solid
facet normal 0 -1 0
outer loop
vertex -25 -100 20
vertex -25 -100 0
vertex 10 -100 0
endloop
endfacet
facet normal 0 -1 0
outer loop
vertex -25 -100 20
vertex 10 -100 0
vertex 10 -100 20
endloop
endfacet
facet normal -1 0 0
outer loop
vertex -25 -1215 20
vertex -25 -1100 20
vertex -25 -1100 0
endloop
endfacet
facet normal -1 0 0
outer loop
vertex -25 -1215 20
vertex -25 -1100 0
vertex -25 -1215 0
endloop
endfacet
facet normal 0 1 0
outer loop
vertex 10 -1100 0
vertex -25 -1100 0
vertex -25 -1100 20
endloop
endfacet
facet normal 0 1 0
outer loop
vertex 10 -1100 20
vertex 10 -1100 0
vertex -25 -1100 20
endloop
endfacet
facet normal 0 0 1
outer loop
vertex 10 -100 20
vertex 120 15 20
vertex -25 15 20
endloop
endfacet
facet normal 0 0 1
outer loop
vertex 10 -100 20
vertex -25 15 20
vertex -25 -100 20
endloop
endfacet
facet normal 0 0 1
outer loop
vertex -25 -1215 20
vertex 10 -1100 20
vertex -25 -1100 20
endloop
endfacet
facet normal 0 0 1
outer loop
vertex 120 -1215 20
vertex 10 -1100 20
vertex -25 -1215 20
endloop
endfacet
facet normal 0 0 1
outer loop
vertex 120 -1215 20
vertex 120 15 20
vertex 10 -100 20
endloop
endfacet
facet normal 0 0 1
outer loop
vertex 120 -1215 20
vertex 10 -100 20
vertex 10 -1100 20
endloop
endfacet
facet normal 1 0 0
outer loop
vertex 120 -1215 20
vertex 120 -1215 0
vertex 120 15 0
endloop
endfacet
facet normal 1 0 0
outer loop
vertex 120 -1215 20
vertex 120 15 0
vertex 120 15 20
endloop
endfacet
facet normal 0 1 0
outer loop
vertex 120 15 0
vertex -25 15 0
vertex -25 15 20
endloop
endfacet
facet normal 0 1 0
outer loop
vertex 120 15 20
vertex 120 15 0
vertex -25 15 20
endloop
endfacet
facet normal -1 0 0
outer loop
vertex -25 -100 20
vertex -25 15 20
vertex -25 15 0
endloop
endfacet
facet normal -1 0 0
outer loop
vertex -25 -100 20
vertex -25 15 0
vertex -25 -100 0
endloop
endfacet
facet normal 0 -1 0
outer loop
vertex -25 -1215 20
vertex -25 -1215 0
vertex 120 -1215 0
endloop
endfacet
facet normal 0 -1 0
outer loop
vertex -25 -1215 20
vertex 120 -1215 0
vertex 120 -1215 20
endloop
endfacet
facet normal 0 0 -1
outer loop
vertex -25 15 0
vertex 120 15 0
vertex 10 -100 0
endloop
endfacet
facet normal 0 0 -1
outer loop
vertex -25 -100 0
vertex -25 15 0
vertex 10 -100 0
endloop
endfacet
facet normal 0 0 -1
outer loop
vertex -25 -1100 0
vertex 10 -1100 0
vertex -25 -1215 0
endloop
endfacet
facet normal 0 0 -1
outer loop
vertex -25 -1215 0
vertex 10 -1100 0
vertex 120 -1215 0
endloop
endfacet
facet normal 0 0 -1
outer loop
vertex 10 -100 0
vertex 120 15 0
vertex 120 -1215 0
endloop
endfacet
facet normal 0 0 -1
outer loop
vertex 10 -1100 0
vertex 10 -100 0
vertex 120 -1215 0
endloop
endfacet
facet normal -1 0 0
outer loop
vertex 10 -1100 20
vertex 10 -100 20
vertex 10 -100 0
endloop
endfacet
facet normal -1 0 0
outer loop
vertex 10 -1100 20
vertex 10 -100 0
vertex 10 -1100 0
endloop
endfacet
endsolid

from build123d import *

# Parameters (mm, degrees)
F0_W     = 120
F0_H     = 20
F1_DEPTH = 1200
F2_DEPTH = 15
F3_DEPTH = 15
F4_W     = 115
F4_H     = 20
F5_DEPTH = 25
F6_DEPTH = 25
F7_W     = 1000
F7_H     = 20
F8_DEPTH = 10


with BuildPart() as f1:
    # F0 (on Front) → F1 (new body)
    with BuildSketch(Plane.XZ):
        with Locations((60, 10)):
            Rectangle(F0_W, F0_H)
    extrude(amount=F1_DEPTH)

    # F2 (add): a face of the model
    f2_faces = [f1.faces().sort_by_distance(p)[0] for p in [
        (60, -1200, 10),
    ]]
    extrude(f2_faces, amount=F2_DEPTH)

    # F3 (add): a face of the model
    f3_faces = [f1.faces().sort_by_distance(p)[0] for p in [
        (60, 0, 10),
    ]]
    extrude(f3_faces, amount=F3_DEPTH)

    # F4 (on face) → F5 (join)
    with BuildSketch(Plane(origin=(0, 0, 0), x_dir=(0, -1, 0), z_dir=(-1, 0, 0))):
        with Locations((1157.5, 10)):
            Rectangle(F4_W, F4_H)
    extrude(amount=F5_DEPTH)

    # F4 (on face) → F6 (join)
    with BuildSketch(Plane(origin=(0, 0, 0), x_dir=(0, -1, 0), z_dir=(-1, 0, 0))):
        with Locations((42.5, 10)):
            Rectangle(F4_W, F4_H)
    extrude(amount=F6_DEPTH)

    # F7 (on face) → F8 (cut)
    with BuildSketch(Plane(origin=(0, 0, 0), x_dir=(0, -1, 0), z_dir=(-1, 0, 0))):
        with Locations((600, 10)):
            Rectangle(F7_W, F7_H)
    extrude(amount=-F8_DEPTH, mode=Mode.SUBTRACT)


solid = f1.part
